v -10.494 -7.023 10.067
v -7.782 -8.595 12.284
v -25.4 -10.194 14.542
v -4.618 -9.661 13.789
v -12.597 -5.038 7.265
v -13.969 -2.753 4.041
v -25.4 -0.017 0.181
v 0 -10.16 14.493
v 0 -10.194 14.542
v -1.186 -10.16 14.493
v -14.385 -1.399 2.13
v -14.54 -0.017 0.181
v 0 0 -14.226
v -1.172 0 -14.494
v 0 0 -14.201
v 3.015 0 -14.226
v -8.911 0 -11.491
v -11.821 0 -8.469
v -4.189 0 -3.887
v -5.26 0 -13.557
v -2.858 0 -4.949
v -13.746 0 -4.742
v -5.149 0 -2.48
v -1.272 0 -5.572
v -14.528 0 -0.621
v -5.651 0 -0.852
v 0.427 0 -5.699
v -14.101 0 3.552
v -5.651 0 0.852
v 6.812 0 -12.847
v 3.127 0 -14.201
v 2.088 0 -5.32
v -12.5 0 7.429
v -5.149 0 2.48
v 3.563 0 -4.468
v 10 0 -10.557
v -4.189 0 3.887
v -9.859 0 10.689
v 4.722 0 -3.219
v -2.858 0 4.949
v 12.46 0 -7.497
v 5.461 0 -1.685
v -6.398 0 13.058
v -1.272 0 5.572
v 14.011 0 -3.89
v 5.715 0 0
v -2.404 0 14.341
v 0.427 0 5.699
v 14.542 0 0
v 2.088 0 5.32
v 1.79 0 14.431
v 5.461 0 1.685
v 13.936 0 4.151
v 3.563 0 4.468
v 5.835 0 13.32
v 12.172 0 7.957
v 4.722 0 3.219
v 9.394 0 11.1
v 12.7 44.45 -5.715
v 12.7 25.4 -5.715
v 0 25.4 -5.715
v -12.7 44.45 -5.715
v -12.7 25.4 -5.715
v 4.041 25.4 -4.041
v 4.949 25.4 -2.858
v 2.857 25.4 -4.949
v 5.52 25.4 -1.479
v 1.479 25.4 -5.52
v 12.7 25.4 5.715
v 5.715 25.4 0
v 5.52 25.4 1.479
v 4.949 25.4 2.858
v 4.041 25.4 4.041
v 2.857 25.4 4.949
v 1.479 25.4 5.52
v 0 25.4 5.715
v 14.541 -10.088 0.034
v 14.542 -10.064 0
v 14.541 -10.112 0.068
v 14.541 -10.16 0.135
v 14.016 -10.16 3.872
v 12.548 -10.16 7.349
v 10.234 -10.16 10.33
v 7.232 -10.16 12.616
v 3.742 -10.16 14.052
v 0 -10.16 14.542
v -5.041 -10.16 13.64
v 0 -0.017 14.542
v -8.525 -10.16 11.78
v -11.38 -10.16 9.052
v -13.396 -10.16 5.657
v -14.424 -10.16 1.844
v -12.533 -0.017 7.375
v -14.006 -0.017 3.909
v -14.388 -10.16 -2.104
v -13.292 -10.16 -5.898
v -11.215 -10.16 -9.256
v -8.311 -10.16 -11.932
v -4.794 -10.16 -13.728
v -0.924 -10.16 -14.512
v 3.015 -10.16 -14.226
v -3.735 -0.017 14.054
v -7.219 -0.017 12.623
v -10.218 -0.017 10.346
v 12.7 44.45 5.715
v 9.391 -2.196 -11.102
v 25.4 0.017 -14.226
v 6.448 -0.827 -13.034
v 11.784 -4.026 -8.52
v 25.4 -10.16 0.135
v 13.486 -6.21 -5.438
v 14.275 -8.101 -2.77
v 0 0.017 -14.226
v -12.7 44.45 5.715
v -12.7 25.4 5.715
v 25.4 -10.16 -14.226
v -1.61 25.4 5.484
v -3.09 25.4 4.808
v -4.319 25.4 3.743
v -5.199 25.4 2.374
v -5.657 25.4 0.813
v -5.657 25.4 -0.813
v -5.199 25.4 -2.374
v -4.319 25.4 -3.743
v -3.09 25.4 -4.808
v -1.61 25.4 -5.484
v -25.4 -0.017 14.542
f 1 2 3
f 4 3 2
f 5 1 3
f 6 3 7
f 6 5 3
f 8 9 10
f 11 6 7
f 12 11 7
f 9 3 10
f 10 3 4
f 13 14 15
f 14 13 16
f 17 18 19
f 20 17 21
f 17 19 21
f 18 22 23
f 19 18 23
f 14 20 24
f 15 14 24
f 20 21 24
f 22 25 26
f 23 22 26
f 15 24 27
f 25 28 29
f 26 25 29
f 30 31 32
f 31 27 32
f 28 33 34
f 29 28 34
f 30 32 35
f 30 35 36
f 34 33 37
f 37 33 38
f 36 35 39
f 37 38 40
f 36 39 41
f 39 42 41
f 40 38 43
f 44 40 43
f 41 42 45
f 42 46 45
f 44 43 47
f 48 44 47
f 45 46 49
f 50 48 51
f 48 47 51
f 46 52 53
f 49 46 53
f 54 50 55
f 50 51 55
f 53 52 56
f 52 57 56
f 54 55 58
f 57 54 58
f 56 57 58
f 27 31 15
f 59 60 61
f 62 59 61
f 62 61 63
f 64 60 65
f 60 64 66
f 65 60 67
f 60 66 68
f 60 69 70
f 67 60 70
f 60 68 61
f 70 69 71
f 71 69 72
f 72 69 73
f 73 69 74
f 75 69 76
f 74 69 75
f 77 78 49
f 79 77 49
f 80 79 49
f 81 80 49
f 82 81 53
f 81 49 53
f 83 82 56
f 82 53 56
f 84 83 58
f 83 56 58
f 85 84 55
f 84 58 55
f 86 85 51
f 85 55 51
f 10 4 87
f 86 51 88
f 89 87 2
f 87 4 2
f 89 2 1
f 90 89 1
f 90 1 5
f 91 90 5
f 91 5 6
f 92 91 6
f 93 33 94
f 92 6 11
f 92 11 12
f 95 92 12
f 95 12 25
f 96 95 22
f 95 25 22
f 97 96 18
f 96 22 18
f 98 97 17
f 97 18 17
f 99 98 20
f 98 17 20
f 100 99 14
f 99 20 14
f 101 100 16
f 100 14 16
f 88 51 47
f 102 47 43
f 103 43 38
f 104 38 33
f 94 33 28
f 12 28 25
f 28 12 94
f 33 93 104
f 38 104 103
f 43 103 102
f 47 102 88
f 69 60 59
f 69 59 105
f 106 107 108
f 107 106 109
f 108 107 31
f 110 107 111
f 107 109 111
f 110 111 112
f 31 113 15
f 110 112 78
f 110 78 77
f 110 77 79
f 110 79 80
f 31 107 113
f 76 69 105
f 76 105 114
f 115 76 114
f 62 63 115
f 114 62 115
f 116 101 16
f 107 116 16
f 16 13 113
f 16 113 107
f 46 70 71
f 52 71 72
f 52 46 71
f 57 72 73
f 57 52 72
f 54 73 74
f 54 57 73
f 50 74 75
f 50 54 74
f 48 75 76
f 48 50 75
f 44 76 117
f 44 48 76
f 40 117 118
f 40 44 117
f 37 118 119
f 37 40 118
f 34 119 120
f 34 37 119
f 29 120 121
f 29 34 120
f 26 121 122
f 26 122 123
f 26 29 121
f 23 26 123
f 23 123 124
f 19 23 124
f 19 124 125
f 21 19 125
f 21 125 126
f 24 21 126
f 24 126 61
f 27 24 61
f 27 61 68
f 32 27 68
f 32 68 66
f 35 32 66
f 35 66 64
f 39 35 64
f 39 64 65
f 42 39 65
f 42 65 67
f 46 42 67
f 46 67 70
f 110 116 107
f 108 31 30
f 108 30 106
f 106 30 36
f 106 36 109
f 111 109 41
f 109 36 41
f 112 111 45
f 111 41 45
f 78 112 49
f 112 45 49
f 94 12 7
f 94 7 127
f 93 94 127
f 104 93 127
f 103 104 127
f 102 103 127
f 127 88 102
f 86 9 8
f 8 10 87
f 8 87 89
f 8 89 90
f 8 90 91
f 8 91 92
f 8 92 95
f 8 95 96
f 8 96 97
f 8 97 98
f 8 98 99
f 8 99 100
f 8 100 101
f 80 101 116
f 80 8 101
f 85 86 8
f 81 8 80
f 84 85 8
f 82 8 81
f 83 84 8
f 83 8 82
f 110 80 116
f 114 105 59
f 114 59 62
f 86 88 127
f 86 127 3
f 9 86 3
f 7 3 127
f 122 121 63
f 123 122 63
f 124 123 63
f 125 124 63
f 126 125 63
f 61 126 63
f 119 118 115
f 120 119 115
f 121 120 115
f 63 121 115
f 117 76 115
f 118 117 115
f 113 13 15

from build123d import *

# Parameters (mm, degrees)
F0_R     = 14.5415
F1_DEPTH = 10.16
F4_DEPTH = 25.4
F5_DEPTH = 25.4
F6_R     = 5.715
F7_DEPTH = 25.4
F8_W     = 25.4
F8_H     = 11.43
F9_DEPTH = 19.05


with BuildPart() as f1:
    # F0 (on Front) → F1 (new body)
    with BuildSketch(Plane.XZ):
        Circle(F0_R)
    extrude(amount=F1_DEPTH)

    # F3 (on Right) → F4 (join)
    with BuildSketch(Plane.YZ):
        Polygon((-10.16, -14.225606), (0.017161, -14.225606), (-10.16, 0.135286), align=None)
    extrude(amount=F4_DEPTH)

    # F2 (on Right) → F5 (join)
    with BuildSketch(Plane.YZ):
        Polygon((-0.017161, 14.5415), (-10.194321, 14.5415), (-0.017161, 0.180608), align=None)
    extrude(amount=-F5_DEPTH)

    # F6 (on Front) → F7 (join)
    with BuildSketch(Plane.XZ):
        Circle(F6_R)
    extrude(amount=-F7_DEPTH)

    # F8 (on face) → F9 (join)
    with BuildSketch(Plane(origin=(0, 25.4, 0), x_dir=(-1, 0, 0), z_dir=(0, 1, 0))):
        Rectangle(F8_W, F8_H)
    extrude(amount=F9_DEPTH)


solid = f1.part
